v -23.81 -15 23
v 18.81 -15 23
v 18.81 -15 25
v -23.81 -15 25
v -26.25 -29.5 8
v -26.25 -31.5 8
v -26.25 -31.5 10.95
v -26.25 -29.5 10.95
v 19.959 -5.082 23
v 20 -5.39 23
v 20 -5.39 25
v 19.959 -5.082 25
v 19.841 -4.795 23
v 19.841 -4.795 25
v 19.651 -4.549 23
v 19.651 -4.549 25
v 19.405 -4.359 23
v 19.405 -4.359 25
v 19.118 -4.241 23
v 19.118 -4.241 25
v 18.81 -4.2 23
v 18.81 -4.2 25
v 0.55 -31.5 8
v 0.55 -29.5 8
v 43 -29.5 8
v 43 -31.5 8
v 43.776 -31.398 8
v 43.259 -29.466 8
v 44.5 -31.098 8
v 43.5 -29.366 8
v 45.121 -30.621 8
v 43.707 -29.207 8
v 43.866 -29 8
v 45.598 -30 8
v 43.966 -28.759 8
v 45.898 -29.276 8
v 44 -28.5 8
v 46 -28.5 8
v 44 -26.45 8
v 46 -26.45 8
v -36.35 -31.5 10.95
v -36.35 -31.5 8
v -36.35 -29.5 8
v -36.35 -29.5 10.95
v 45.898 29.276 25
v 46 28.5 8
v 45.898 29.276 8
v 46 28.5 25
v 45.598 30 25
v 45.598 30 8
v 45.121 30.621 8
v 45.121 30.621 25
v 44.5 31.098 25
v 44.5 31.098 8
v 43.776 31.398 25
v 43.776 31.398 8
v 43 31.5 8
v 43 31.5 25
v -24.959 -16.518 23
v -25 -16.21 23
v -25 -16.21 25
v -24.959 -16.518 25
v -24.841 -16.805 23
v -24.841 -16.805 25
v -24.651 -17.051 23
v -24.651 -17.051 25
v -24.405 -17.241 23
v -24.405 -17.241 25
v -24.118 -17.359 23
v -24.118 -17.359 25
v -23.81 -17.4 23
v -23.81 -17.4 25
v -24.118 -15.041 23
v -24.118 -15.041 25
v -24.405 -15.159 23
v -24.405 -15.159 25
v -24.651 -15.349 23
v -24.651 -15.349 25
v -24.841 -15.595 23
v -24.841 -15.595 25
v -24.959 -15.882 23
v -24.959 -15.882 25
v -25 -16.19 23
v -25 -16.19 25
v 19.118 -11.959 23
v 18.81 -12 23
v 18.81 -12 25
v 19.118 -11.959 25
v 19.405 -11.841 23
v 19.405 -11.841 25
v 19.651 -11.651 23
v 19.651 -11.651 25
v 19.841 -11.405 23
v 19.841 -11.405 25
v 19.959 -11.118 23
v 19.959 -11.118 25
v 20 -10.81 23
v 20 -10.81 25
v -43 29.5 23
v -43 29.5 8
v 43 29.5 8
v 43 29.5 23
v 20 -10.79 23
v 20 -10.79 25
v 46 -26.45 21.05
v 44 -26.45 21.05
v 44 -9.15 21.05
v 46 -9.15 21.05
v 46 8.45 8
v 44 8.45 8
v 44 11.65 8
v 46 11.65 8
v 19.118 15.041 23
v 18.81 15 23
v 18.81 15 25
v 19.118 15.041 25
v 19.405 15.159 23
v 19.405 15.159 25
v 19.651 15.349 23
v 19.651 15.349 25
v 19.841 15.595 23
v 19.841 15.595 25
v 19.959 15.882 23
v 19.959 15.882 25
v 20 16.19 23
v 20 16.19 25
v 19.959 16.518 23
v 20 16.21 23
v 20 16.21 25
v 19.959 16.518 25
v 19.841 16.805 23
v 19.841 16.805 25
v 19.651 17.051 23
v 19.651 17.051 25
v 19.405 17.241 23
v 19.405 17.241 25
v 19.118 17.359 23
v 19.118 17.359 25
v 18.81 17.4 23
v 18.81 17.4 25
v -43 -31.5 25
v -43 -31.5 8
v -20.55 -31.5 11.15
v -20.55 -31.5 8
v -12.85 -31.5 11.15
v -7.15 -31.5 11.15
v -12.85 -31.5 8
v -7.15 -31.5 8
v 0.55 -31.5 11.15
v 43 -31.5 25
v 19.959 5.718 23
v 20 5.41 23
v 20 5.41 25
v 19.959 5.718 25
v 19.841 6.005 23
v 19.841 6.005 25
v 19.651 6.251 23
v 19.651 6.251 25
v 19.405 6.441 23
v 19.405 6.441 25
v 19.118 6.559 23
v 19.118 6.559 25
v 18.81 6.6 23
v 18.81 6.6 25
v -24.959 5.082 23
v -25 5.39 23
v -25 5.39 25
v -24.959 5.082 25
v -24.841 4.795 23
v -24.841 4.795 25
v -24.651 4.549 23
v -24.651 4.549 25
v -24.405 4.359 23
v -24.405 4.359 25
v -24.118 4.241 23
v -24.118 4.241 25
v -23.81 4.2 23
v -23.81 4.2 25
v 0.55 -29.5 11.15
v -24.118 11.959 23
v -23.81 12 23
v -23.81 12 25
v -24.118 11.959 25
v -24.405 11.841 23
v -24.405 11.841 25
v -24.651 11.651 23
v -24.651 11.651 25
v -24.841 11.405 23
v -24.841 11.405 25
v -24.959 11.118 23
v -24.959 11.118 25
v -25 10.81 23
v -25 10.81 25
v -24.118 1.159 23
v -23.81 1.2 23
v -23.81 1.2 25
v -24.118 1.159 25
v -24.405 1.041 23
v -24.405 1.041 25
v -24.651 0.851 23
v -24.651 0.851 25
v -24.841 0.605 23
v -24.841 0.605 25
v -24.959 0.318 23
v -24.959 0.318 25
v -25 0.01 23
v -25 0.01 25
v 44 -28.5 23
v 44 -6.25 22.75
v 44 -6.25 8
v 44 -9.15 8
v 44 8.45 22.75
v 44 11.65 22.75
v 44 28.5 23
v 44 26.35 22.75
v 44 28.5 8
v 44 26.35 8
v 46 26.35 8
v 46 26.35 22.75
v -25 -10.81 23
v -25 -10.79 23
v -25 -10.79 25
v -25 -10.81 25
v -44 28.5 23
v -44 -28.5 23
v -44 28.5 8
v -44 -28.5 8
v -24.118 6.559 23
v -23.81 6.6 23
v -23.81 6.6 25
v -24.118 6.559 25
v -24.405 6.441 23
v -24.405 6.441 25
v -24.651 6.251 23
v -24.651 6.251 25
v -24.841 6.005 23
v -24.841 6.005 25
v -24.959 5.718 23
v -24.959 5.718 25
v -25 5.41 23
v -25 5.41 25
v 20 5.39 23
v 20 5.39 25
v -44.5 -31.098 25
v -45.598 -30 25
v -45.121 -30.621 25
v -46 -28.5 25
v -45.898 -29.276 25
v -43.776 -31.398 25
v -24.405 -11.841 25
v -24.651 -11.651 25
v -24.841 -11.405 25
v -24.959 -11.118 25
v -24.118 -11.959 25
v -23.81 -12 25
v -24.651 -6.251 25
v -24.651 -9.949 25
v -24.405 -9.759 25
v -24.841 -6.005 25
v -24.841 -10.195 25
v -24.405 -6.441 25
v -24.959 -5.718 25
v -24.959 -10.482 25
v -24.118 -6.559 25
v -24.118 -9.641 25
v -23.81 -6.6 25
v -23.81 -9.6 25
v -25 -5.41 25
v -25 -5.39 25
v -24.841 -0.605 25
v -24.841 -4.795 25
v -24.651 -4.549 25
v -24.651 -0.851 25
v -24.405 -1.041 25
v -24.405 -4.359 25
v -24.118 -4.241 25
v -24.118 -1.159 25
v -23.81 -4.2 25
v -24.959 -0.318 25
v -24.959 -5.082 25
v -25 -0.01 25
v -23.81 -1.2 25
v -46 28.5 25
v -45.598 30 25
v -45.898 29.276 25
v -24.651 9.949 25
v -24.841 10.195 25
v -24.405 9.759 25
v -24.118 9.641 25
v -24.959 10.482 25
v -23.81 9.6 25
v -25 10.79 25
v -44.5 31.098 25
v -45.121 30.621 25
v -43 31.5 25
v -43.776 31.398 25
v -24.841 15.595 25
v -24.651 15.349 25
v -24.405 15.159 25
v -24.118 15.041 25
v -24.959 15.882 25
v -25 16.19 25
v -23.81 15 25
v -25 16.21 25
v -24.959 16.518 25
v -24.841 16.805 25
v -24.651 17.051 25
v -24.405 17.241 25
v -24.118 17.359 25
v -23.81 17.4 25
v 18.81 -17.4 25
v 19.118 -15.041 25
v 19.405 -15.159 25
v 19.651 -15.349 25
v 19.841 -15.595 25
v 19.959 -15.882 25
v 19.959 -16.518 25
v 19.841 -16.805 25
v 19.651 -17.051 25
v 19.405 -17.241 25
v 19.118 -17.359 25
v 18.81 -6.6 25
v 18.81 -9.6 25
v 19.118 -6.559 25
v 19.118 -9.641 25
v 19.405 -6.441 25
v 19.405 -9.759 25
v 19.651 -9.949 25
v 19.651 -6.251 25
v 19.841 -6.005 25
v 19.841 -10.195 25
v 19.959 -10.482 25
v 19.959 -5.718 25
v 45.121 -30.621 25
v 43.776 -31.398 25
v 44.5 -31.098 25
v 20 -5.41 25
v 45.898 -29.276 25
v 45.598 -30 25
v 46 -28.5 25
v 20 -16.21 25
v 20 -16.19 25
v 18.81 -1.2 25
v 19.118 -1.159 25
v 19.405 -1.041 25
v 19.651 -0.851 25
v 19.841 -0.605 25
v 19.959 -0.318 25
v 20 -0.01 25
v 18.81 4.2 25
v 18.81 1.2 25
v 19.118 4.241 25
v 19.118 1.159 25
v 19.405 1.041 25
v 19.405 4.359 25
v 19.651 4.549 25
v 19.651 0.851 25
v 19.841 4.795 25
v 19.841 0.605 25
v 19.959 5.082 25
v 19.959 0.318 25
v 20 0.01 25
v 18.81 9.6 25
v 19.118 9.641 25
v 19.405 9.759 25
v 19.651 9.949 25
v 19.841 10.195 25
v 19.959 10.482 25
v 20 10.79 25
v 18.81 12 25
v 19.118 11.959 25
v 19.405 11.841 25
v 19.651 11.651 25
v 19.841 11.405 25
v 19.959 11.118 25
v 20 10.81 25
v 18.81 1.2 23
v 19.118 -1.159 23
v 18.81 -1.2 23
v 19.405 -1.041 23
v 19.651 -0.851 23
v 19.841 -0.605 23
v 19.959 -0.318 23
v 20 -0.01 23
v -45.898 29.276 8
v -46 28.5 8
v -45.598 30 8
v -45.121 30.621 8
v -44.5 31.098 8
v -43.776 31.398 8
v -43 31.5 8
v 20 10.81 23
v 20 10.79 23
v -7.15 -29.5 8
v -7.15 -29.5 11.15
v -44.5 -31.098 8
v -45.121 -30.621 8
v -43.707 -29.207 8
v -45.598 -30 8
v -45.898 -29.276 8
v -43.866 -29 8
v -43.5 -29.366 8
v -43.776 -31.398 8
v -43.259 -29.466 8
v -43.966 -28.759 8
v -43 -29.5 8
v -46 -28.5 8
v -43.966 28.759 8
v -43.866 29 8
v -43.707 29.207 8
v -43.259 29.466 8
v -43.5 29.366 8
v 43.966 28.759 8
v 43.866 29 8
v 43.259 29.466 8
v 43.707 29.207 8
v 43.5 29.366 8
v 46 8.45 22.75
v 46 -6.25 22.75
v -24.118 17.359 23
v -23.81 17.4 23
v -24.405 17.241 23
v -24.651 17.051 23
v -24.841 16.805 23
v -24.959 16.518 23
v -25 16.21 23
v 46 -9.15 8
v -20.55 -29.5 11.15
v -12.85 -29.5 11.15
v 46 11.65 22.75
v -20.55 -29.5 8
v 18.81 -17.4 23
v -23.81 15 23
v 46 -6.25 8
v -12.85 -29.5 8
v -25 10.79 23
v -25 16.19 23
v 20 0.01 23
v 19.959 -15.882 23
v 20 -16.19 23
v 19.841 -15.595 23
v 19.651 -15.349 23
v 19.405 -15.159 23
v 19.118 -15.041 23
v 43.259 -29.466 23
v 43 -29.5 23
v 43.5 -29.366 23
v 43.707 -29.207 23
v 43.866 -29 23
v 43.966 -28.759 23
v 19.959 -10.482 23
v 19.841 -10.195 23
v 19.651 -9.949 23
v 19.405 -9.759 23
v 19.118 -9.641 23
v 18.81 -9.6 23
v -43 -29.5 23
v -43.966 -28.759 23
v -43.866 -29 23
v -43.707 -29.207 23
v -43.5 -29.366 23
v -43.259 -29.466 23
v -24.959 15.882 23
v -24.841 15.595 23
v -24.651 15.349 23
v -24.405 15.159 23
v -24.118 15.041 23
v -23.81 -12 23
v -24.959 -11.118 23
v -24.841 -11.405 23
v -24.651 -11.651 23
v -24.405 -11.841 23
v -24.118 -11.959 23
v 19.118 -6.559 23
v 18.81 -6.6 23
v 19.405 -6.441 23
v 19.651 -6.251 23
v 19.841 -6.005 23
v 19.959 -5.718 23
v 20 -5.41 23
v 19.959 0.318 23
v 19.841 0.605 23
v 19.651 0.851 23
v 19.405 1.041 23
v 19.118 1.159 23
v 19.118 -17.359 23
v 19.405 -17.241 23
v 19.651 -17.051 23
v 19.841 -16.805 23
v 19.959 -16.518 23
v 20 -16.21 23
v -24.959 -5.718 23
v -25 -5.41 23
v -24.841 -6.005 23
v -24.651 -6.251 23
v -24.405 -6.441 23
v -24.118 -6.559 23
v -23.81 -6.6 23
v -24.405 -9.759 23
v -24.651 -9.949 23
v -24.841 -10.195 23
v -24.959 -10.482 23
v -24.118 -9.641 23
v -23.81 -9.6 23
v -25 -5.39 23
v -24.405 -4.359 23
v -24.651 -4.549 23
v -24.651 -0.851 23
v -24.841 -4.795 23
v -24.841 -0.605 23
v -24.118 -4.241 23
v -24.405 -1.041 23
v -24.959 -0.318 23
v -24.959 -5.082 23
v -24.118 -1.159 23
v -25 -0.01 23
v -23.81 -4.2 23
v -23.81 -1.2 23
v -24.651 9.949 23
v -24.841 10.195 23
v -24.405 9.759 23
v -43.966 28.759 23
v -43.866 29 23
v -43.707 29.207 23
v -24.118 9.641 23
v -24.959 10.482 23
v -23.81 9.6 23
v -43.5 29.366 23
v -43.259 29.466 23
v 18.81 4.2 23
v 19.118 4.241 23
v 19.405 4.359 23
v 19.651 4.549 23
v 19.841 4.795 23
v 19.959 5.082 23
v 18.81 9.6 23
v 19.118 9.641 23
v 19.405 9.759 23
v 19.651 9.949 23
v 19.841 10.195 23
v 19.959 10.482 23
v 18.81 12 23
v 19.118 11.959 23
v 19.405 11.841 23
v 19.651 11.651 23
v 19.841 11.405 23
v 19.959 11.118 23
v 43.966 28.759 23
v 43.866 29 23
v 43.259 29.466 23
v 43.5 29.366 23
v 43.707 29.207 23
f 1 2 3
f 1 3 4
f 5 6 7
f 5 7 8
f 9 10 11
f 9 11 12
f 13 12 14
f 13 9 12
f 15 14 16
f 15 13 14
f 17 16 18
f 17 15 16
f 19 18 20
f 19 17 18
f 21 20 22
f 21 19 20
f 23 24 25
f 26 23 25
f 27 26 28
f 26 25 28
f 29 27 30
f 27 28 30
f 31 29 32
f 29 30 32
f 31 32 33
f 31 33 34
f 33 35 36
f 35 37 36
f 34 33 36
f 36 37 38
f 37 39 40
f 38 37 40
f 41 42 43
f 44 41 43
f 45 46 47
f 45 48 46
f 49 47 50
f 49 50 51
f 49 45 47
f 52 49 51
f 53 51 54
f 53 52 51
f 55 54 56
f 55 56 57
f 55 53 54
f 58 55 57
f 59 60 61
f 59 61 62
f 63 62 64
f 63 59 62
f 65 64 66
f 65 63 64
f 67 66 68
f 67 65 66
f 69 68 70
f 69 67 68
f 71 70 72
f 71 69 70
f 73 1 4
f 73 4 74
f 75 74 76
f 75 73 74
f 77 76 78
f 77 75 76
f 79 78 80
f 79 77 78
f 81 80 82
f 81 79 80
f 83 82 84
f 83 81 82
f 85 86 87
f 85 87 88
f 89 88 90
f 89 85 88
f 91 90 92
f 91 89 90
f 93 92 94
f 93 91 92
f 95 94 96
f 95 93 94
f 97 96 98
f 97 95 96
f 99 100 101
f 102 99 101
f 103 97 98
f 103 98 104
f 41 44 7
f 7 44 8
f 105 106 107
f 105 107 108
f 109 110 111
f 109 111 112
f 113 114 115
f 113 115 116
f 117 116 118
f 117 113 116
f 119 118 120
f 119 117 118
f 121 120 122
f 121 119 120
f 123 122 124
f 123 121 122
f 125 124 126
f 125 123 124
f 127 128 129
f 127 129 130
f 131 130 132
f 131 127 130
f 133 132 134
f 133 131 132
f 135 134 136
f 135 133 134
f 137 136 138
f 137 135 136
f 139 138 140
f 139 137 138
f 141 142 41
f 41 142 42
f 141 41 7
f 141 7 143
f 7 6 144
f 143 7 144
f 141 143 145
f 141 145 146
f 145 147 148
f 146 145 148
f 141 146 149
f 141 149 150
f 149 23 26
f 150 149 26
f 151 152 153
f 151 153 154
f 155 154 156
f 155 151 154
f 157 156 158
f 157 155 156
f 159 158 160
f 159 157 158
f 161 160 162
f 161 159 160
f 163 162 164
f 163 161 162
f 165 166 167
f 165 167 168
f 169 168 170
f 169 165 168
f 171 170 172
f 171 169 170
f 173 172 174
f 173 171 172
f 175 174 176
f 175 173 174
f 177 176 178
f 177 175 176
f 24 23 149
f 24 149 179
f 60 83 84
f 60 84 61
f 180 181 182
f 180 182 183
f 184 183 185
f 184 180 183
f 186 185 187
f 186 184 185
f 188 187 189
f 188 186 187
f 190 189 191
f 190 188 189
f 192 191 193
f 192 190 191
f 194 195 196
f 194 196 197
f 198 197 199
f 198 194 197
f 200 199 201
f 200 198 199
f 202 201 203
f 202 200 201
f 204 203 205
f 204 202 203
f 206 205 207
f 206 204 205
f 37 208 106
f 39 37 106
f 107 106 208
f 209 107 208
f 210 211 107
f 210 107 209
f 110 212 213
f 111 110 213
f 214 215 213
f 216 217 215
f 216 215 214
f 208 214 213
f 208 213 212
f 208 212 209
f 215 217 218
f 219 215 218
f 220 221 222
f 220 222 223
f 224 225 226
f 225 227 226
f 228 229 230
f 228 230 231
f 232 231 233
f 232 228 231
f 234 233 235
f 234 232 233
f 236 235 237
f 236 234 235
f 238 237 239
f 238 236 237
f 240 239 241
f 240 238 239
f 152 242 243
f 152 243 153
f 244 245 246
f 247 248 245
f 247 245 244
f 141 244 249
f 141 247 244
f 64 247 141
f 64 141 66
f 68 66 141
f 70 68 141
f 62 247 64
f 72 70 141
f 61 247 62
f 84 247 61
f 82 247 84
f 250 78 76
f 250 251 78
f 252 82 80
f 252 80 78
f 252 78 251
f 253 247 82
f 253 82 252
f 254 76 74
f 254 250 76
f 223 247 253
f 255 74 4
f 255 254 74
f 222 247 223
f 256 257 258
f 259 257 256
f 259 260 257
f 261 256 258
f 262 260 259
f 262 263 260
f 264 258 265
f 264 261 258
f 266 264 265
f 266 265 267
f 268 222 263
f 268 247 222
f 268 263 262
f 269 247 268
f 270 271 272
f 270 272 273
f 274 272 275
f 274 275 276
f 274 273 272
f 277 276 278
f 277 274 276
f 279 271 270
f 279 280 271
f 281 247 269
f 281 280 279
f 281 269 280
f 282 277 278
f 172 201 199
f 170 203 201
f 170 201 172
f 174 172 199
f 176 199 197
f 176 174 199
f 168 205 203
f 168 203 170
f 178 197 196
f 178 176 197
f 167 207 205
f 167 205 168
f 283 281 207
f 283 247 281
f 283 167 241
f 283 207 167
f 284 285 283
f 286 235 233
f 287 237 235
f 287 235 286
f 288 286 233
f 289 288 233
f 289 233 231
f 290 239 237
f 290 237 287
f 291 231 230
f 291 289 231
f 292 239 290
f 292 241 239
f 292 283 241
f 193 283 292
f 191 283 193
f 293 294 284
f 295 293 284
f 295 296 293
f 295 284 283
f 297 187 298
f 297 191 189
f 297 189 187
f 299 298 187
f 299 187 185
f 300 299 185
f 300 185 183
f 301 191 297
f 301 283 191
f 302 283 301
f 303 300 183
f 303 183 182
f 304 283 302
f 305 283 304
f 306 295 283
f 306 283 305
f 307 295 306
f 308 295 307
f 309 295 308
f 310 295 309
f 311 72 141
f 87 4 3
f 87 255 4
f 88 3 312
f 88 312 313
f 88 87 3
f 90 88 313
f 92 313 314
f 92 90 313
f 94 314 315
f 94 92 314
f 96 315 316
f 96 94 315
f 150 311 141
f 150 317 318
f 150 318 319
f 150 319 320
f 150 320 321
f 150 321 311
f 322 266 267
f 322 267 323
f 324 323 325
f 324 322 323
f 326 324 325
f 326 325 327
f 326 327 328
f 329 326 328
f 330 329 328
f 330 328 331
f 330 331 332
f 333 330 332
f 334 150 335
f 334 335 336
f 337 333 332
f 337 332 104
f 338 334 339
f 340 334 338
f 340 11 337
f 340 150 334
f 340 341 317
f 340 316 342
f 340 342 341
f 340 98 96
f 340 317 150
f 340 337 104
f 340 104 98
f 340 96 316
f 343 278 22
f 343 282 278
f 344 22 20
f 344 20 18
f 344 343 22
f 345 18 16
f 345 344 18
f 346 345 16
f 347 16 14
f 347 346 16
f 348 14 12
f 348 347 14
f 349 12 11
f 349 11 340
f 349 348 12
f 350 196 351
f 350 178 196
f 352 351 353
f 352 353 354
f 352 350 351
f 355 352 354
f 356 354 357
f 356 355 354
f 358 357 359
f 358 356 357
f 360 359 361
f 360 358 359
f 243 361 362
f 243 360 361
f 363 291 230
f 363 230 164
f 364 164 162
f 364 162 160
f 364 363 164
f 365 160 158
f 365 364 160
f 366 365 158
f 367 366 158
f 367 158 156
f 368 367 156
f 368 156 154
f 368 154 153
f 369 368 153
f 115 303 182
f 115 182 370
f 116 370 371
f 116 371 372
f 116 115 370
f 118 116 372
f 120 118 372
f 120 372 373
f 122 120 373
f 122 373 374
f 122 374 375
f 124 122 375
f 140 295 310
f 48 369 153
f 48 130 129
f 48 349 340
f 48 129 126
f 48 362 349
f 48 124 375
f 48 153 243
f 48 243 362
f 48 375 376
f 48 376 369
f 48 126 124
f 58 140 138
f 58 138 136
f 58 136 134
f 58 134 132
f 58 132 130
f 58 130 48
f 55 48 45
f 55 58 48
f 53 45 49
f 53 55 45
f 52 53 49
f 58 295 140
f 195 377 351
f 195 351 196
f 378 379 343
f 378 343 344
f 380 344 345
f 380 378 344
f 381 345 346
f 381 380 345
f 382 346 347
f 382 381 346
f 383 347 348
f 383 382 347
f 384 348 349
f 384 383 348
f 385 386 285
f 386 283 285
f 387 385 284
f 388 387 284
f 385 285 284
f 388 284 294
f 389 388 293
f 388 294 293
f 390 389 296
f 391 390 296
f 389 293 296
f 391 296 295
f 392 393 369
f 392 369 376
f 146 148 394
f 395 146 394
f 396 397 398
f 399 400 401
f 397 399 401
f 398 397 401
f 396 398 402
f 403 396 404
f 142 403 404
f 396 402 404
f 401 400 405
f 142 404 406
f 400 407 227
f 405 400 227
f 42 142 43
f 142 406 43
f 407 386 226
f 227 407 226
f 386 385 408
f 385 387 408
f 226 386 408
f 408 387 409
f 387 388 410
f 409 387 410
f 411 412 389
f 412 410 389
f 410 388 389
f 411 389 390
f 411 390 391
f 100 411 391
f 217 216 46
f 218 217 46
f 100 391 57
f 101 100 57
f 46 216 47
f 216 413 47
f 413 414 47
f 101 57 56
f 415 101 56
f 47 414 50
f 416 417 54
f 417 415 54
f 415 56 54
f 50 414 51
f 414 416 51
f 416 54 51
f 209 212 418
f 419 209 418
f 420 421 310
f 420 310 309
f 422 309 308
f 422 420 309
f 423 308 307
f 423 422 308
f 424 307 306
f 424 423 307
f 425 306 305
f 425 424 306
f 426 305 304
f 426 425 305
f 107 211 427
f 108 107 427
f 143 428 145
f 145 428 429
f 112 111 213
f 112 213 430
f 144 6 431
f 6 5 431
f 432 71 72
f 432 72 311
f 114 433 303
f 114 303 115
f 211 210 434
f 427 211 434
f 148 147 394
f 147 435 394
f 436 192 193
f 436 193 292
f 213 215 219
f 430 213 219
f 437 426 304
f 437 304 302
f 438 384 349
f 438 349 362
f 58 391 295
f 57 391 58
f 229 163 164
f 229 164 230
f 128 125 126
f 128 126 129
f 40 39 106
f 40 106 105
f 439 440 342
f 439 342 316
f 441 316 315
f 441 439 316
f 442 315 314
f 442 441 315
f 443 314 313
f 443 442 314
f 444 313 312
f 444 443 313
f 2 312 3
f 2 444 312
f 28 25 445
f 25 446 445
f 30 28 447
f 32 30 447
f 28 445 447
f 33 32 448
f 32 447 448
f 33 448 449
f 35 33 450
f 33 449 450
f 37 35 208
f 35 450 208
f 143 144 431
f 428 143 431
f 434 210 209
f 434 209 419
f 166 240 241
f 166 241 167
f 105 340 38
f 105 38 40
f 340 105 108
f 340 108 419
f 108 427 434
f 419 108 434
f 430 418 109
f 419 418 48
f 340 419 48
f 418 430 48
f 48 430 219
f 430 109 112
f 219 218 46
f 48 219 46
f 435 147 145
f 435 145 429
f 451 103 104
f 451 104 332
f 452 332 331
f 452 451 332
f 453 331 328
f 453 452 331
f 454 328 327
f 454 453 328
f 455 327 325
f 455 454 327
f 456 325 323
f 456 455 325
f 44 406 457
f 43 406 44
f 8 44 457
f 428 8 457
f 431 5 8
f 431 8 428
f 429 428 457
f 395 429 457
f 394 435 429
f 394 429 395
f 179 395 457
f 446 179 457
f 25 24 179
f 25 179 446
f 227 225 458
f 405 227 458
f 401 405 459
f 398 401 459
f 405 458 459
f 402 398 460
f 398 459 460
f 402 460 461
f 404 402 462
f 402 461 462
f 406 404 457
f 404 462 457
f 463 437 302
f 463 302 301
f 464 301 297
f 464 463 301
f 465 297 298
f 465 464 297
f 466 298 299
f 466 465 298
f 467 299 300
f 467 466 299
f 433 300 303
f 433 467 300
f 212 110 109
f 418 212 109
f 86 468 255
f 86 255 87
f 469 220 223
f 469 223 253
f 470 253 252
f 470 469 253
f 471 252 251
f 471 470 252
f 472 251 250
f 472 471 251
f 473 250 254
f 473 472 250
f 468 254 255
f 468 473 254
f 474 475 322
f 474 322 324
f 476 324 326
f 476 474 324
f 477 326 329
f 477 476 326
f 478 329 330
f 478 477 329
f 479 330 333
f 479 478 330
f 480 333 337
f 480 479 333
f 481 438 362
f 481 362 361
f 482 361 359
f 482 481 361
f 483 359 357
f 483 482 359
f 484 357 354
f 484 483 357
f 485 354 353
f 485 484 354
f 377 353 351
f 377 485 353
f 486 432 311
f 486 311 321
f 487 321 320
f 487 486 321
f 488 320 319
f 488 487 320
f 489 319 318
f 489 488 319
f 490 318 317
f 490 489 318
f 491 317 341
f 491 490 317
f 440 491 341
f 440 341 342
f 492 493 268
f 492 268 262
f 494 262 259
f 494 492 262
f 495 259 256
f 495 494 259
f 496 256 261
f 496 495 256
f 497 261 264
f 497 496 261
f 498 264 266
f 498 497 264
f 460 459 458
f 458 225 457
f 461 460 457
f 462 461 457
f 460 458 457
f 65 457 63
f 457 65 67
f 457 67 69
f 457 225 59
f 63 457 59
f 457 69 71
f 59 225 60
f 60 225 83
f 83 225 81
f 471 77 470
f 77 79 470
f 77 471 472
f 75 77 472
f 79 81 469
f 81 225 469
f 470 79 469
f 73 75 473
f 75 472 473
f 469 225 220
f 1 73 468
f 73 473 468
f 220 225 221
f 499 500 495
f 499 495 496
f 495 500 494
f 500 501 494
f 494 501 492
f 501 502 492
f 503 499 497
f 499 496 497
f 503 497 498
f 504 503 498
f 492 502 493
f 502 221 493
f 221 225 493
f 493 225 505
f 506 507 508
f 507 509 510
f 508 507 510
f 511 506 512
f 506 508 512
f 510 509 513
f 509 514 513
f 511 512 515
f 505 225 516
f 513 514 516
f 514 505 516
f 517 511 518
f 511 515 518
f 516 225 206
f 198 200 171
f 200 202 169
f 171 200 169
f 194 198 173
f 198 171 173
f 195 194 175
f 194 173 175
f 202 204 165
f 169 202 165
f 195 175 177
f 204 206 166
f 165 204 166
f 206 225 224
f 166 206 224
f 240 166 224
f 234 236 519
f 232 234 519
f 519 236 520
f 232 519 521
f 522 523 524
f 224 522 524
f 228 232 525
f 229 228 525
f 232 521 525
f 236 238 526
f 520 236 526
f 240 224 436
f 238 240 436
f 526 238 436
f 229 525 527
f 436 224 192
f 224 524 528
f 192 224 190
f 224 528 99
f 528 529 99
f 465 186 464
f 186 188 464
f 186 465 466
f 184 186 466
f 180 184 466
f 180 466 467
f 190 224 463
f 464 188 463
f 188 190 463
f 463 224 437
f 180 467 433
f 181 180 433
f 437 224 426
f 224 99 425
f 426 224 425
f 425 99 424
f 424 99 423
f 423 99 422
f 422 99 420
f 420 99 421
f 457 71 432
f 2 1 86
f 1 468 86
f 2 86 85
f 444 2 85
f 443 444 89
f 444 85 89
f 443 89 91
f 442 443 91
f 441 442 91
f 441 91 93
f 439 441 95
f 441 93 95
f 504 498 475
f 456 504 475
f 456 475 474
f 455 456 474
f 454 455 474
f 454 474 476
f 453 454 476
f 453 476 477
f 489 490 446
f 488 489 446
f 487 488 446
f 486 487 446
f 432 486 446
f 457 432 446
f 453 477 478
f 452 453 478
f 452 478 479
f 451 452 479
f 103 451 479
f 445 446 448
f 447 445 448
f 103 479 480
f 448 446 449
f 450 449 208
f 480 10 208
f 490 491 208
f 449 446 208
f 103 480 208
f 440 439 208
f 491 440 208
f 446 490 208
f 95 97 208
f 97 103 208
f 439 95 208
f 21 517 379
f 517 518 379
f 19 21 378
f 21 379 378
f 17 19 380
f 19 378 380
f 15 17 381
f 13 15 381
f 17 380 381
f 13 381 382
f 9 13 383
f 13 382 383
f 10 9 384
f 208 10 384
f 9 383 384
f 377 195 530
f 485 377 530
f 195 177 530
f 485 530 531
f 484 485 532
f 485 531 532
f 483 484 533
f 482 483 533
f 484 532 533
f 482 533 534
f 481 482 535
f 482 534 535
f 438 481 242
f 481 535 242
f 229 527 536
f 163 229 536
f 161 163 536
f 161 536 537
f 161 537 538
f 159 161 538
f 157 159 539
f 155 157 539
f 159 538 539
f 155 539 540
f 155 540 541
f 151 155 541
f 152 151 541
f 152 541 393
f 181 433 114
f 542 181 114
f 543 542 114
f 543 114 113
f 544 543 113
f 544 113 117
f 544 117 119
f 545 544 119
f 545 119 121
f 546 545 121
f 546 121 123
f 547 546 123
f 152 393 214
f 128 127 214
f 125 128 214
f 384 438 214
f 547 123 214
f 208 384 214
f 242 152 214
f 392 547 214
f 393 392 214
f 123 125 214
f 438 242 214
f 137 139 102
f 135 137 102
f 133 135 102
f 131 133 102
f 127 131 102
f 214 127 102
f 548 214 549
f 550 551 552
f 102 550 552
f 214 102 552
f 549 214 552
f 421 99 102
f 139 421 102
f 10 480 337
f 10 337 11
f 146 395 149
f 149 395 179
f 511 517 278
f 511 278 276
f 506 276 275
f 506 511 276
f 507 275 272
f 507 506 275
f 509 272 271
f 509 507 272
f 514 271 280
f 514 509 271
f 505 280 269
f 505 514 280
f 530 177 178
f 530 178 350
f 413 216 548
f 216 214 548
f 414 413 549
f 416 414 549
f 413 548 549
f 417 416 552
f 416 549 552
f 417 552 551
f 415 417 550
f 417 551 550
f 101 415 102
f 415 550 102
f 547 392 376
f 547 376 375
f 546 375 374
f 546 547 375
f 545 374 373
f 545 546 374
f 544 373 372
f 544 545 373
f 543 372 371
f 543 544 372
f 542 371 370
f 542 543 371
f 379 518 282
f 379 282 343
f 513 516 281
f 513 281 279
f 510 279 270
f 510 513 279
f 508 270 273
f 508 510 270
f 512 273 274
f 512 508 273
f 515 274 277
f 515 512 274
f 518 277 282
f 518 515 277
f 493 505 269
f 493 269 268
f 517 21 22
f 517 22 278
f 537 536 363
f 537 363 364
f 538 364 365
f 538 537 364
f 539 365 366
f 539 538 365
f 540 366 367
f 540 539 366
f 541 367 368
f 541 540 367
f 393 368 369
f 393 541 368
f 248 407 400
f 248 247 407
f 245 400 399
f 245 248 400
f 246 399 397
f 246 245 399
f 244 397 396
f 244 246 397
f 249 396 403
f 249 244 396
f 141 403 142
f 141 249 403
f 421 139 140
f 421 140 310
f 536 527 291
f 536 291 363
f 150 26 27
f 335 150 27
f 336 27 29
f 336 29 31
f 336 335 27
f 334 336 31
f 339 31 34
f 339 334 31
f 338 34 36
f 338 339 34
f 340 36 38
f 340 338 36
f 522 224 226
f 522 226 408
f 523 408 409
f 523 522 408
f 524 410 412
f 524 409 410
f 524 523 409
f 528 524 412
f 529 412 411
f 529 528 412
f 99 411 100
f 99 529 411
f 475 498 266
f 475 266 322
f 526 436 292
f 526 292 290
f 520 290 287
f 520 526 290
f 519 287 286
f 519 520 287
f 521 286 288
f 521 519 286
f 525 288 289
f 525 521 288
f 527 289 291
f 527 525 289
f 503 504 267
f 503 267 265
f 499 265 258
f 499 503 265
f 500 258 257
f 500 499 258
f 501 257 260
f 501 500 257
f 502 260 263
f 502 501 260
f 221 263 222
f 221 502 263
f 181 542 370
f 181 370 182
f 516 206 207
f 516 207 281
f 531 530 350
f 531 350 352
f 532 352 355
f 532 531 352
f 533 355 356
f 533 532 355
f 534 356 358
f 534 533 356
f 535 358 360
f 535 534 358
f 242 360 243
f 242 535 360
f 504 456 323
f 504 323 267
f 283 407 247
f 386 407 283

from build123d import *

# Parameters (mm, degrees)
TOP_ENVELOPE_START         = 8
CASEENVELOPE_W             = 92
CASEENVELOPE_H             = 63
TOP_ENVELOPE_DEPTH         = 17
OUTSIDE_R3_R               = 3
SHELL_1_T                  = -2
SIDEPORT_CLEARANCE_1_START = 6.45
SIDEPORT_PROFILE_1_W       = 10.1
SIDEPORT_PROFILE_1_H       = 13
SIDEPORT_CLEARANCE_1_DEPTH = 4.5
SIDEPORT_CLEARANCE_2_START = 6.45
SIDEPORT_PROFILE_2_W       = 7.7
SIDEPORT_PROFILE_2_H       = 13
SIDEPORT_CLEARANCE_2_DEPTH = 4.7
SIDEPORT_CLEARANCE_3_START = 6.45
SIDEPORT_PROFILE_3_W       = 7.7
SIDEPORT_PROFILE_3_H       = 13
SIDEPORT_CLEARANCE_3_DEPTH = 4.7
ENDPORT_CLEARANCE_1_START  = 6.45
ENDPORT_PROFILE_1_W        = 11
ENDPORT_PROFILE_1_H        = 17.3
ENDPORT_CLEARANCE_1_DEPTH  = 14.6
ENDPORT_CLEARANCE_2_START  = 6.45
ENDPORT_PROFILE_2_W        = 11
ENDPORT_PROFILE_2_H        = 14.7
ENDPORT_CLEARANCE_2_DEPTH  = 16.3
ENDPORT_CLEARANCE_3_START  = 6.45
ENDPORT_PROFILE_3_W        = 11
ENDPORT_PROFILE_3_H        = 14.7
ENDPORT_CLEARANCE_3_DEPTH  = 16.3
COOLING_SLOTS_START        = 22.5
COOLING_SLOTS_DEPTH        = 3


with BuildPart() as part:
    # CaseEnvelope → Top_Envelope (new body)
    with BuildSketch(Plane.XY.offset(TOP_ENVELOPE_START)):
        Rectangle(CASEENVELOPE_W, CASEENVELOPE_H)
    extrude(amount=TOP_ENVELOPE_DEPTH)

    # Outside_R3
    outside_r3_edges = [part.edges().sort_by_distance(p)[0] for p in [
        (46, -31.5, 16.5),
        (-46, -31.5, 16.5),
        (-46, 31.5, 16.5),
        (46, 31.5, 16.5),
    ]]
    fillet(outside_r3_edges, radius=OUTSIDE_R3_R)

    # Shell 1
    shell_1_openings = [part.faces().sort_by_distance(p)[0] for p in [
        (0, 0, 8),
    ]]
    offset(amount=SHELL_1_T, openings=shell_1_openings, kind=Kind.INTERSECTION)

    # SidePort_Profile_1 → SidePort_Clearance_1 (cut)
    with BuildSketch(Plane.XY.offset(SIDEPORT_CLEARANCE_1_START)):
        with Locations((-31.3, -33.5)):
            Rectangle(SIDEPORT_PROFILE_1_W, SIDEPORT_PROFILE_1_H)
    extrude(amount=SIDEPORT_CLEARANCE_1_DEPTH, mode=Mode.SUBTRACT)

    # SidePort_Profile_2 → SidePort_Clearance_2 (cut)
    with BuildSketch(Plane.XY.offset(SIDEPORT_CLEARANCE_2_START)):
        with Locations((-16.7, -33.5)):
            Rectangle(SIDEPORT_PROFILE_2_W, SIDEPORT_PROFILE_2_H)
    extrude(amount=SIDEPORT_CLEARANCE_2_DEPTH, mode=Mode.SUBTRACT)

    # SidePort_Profile_3 → SidePort_Clearance_3 (cut)
    with BuildSketch(Plane.XY.offset(SIDEPORT_CLEARANCE_3_START)):
        with Locations((-3.3, -33.5)):
            Rectangle(SIDEPORT_PROFILE_3_W, SIDEPORT_PROFILE_3_H)
    extrude(amount=SIDEPORT_CLEARANCE_3_DEPTH, mode=Mode.SUBTRACT)

    # EndPort_Profile_1 → EndPort_Clearance_1 (cut)
    with BuildSketch(Plane.XY.offset(ENDPORT_CLEARANCE_1_START)):
        with Locations((47.5, -17.8)):
            Rectangle(ENDPORT_PROFILE_1_W, ENDPORT_PROFILE_1_H)
    extrude(amount=ENDPORT_CLEARANCE_1_DEPTH, mode=Mode.SUBTRACT)

    # EndPort_Profile_2 → EndPort_Clearance_2 (cut)
    with BuildSketch(Plane.XY.offset(ENDPORT_CLEARANCE_2_START)):
        with Locations((47.5, 1.1)):
            Rectangle(ENDPORT_PROFILE_2_W, ENDPORT_PROFILE_2_H)
    extrude(amount=ENDPORT_CLEARANCE_2_DEPTH, mode=Mode.SUBTRACT)

    # EndPort_Profile_3 → EndPort_Clearance_3 (cut)
    with BuildSketch(Plane.XY.offset(ENDPORT_CLEARANCE_3_START)):
        with Locations((47.5, 19)):
            Rectangle(ENDPORT_PROFILE_3_W, ENDPORT_PROFILE_3_H)
    extrude(amount=ENDPORT_CLEARANCE_3_DEPTH, mode=Mode.SUBTRACT)

    # Cooling_Slot_Profiles → Cooling_Slots (cut)
    with BuildSketch(Plane.XY.offset(COOLING_SLOTS_START)):
        with BuildLine():
            Line((-23.81, -17.4), (18.81, -17.4))
            ThreePointArc((18.81, -17.4), (19.65145707, -17.05145707), (20, -16.21))
            Line((20, -16.21), (20, -16.19))
            ThreePointArc((20, -16.19), (19.65145707, -15.34854293), (18.81, -15))
            Line((18.81, -15), (-23.81, -15))
            ThreePointArc((-23.81, -15), (-24.65145707, -15.34854293), (-25, -16.19))
            Line((-25, -16.19), (-25, -16.21))
            ThreePointArc((-25, -16.21), (-24.65145707, -17.05145707), (-23.81, -17.4))
        make_face()
        with BuildLine():
            Line((-23.81, -12), (18.81, -12))
            ThreePointArc((18.81, -12), (19.65145707, -11.65145707), (20, -10.81))
            Line((20, -10.81), (20, -10.79))
            ThreePointArc((20, -10.79), (19.65145707, -9.94854293), (18.81, -9.6))
            Line((18.81, -9.6), (-23.81, -9.6))
            ThreePointArc((-23.81, -9.6), (-24.65145707, -9.94854293), (-25, -10.79))
            Line((-25, -10.79), (-25, -10.81))
            ThreePointArc((-25, -10.81), (-24.65145707, -11.65145707), (-23.81, -12))
        make_face()
        with BuildLine():
            Line((-23.81, -6.6), (18.81, -6.6))
            ThreePointArc((18.81, -6.6), (19.65145707, -6.25145707), (20, -5.41))
            Line((20, -5.41), (20, -5.39))
            ThreePointArc((20, -5.39), (19.65145707, -4.54854293), (18.81, -4.2))
            Line((18.81, -4.2), (-23.81, -4.2))
            ThreePointArc((-23.81, -4.2), (-24.65145707, -4.54854293), (-25, -5.39))
            Line((-25, -5.39), (-25, -5.41))
            ThreePointArc((-25, -5.41), (-24.65145707, -6.25145707), (-23.81, -6.6))
        make_face()
        with BuildLine():
            Line((-23.81, -1.2), (18.81, -1.2))
            ThreePointArc((18.81, -1.2), (19.65145707, -0.85145707), (20, -0.01))
            Line((20, -0.01), (20, 0.01))
            ThreePointArc((20, 0.01), (19.65145707, 0.85145707), (18.81, 1.2))
            Line((18.81, 1.2), (-23.81, 1.2))
            ThreePointArc((-23.81, 1.2), (-24.65145707, 0.85145707), (-25, 0.01))
            Line((-25, 0.01), (-25, -0.01))
            ThreePointArc((-25, -0.01), (-24.65145707, -0.85145707), (-23.81, -1.2))
        make_face()
        with BuildLine():
            Line((-23.81, 4.2), (18.81, 4.2))
            ThreePointArc((18.81, 4.2), (19.65145707, 4.54854293), (20, 5.39))
            Line((20, 5.39), (20, 5.41))
            ThreePointArc((20, 5.41), (19.65145707, 6.25145707), (18.81, 6.6))
            Line((18.81, 6.6), (-23.81, 6.6))
            ThreePointArc((-23.81, 6.6), (-24.65145707, 6.25145707), (-25, 5.41))
            Line((-25, 5.41), (-25, 5.39))
            ThreePointArc((-25, 5.39), (-24.65145707, 4.54854293), (-23.81, 4.2))
        make_face()
        with BuildLine():
            Line((-23.81, 9.6), (18.81, 9.6))
            ThreePointArc((18.81, 9.6), (19.65145707, 9.94854293), (20, 10.79))
            Line((20, 10.79), (20, 10.81))
            ThreePointArc((20, 10.81), (19.65145707, 11.65145707), (18.81, 12))
            Line((18.81, 12), (-23.81, 12))
            ThreePointArc((-23.81, 12), (-24.65145707, 11.65145707), (-25, 10.81))
            Line((-25, 10.81), (-25, 10.79))
            ThreePointArc((-25, 10.79), (-24.65145707, 9.94854293), (-23.81, 9.6))
        make_face()
        with BuildLine():
            Line((-23.81, 15), (18.81, 15))
            ThreePointArc((18.81, 15), (19.65145707, 15.34854293), (20, 16.19))
            Line((20, 16.19), (20, 16.21))
            ThreePointArc((20, 16.21), (19.65145707, 17.05145707), (18.81, 17.4))
            Line((18.81, 17.4), (-23.81, 17.4))
            ThreePointArc((-23.81, 17.4), (-24.65145707, 17.05145707), (-25, 16.21))
            Line((-25, 16.21), (-25, 16.19))
            ThreePointArc((-25, 16.19), (-24.65145707, 15.34854293), (-23.81, 15))
        make_face()
    extrude(amount=COOLING_SLOTS_DEPTH, mode=Mode.SUBTRACT)


solid = part.part
